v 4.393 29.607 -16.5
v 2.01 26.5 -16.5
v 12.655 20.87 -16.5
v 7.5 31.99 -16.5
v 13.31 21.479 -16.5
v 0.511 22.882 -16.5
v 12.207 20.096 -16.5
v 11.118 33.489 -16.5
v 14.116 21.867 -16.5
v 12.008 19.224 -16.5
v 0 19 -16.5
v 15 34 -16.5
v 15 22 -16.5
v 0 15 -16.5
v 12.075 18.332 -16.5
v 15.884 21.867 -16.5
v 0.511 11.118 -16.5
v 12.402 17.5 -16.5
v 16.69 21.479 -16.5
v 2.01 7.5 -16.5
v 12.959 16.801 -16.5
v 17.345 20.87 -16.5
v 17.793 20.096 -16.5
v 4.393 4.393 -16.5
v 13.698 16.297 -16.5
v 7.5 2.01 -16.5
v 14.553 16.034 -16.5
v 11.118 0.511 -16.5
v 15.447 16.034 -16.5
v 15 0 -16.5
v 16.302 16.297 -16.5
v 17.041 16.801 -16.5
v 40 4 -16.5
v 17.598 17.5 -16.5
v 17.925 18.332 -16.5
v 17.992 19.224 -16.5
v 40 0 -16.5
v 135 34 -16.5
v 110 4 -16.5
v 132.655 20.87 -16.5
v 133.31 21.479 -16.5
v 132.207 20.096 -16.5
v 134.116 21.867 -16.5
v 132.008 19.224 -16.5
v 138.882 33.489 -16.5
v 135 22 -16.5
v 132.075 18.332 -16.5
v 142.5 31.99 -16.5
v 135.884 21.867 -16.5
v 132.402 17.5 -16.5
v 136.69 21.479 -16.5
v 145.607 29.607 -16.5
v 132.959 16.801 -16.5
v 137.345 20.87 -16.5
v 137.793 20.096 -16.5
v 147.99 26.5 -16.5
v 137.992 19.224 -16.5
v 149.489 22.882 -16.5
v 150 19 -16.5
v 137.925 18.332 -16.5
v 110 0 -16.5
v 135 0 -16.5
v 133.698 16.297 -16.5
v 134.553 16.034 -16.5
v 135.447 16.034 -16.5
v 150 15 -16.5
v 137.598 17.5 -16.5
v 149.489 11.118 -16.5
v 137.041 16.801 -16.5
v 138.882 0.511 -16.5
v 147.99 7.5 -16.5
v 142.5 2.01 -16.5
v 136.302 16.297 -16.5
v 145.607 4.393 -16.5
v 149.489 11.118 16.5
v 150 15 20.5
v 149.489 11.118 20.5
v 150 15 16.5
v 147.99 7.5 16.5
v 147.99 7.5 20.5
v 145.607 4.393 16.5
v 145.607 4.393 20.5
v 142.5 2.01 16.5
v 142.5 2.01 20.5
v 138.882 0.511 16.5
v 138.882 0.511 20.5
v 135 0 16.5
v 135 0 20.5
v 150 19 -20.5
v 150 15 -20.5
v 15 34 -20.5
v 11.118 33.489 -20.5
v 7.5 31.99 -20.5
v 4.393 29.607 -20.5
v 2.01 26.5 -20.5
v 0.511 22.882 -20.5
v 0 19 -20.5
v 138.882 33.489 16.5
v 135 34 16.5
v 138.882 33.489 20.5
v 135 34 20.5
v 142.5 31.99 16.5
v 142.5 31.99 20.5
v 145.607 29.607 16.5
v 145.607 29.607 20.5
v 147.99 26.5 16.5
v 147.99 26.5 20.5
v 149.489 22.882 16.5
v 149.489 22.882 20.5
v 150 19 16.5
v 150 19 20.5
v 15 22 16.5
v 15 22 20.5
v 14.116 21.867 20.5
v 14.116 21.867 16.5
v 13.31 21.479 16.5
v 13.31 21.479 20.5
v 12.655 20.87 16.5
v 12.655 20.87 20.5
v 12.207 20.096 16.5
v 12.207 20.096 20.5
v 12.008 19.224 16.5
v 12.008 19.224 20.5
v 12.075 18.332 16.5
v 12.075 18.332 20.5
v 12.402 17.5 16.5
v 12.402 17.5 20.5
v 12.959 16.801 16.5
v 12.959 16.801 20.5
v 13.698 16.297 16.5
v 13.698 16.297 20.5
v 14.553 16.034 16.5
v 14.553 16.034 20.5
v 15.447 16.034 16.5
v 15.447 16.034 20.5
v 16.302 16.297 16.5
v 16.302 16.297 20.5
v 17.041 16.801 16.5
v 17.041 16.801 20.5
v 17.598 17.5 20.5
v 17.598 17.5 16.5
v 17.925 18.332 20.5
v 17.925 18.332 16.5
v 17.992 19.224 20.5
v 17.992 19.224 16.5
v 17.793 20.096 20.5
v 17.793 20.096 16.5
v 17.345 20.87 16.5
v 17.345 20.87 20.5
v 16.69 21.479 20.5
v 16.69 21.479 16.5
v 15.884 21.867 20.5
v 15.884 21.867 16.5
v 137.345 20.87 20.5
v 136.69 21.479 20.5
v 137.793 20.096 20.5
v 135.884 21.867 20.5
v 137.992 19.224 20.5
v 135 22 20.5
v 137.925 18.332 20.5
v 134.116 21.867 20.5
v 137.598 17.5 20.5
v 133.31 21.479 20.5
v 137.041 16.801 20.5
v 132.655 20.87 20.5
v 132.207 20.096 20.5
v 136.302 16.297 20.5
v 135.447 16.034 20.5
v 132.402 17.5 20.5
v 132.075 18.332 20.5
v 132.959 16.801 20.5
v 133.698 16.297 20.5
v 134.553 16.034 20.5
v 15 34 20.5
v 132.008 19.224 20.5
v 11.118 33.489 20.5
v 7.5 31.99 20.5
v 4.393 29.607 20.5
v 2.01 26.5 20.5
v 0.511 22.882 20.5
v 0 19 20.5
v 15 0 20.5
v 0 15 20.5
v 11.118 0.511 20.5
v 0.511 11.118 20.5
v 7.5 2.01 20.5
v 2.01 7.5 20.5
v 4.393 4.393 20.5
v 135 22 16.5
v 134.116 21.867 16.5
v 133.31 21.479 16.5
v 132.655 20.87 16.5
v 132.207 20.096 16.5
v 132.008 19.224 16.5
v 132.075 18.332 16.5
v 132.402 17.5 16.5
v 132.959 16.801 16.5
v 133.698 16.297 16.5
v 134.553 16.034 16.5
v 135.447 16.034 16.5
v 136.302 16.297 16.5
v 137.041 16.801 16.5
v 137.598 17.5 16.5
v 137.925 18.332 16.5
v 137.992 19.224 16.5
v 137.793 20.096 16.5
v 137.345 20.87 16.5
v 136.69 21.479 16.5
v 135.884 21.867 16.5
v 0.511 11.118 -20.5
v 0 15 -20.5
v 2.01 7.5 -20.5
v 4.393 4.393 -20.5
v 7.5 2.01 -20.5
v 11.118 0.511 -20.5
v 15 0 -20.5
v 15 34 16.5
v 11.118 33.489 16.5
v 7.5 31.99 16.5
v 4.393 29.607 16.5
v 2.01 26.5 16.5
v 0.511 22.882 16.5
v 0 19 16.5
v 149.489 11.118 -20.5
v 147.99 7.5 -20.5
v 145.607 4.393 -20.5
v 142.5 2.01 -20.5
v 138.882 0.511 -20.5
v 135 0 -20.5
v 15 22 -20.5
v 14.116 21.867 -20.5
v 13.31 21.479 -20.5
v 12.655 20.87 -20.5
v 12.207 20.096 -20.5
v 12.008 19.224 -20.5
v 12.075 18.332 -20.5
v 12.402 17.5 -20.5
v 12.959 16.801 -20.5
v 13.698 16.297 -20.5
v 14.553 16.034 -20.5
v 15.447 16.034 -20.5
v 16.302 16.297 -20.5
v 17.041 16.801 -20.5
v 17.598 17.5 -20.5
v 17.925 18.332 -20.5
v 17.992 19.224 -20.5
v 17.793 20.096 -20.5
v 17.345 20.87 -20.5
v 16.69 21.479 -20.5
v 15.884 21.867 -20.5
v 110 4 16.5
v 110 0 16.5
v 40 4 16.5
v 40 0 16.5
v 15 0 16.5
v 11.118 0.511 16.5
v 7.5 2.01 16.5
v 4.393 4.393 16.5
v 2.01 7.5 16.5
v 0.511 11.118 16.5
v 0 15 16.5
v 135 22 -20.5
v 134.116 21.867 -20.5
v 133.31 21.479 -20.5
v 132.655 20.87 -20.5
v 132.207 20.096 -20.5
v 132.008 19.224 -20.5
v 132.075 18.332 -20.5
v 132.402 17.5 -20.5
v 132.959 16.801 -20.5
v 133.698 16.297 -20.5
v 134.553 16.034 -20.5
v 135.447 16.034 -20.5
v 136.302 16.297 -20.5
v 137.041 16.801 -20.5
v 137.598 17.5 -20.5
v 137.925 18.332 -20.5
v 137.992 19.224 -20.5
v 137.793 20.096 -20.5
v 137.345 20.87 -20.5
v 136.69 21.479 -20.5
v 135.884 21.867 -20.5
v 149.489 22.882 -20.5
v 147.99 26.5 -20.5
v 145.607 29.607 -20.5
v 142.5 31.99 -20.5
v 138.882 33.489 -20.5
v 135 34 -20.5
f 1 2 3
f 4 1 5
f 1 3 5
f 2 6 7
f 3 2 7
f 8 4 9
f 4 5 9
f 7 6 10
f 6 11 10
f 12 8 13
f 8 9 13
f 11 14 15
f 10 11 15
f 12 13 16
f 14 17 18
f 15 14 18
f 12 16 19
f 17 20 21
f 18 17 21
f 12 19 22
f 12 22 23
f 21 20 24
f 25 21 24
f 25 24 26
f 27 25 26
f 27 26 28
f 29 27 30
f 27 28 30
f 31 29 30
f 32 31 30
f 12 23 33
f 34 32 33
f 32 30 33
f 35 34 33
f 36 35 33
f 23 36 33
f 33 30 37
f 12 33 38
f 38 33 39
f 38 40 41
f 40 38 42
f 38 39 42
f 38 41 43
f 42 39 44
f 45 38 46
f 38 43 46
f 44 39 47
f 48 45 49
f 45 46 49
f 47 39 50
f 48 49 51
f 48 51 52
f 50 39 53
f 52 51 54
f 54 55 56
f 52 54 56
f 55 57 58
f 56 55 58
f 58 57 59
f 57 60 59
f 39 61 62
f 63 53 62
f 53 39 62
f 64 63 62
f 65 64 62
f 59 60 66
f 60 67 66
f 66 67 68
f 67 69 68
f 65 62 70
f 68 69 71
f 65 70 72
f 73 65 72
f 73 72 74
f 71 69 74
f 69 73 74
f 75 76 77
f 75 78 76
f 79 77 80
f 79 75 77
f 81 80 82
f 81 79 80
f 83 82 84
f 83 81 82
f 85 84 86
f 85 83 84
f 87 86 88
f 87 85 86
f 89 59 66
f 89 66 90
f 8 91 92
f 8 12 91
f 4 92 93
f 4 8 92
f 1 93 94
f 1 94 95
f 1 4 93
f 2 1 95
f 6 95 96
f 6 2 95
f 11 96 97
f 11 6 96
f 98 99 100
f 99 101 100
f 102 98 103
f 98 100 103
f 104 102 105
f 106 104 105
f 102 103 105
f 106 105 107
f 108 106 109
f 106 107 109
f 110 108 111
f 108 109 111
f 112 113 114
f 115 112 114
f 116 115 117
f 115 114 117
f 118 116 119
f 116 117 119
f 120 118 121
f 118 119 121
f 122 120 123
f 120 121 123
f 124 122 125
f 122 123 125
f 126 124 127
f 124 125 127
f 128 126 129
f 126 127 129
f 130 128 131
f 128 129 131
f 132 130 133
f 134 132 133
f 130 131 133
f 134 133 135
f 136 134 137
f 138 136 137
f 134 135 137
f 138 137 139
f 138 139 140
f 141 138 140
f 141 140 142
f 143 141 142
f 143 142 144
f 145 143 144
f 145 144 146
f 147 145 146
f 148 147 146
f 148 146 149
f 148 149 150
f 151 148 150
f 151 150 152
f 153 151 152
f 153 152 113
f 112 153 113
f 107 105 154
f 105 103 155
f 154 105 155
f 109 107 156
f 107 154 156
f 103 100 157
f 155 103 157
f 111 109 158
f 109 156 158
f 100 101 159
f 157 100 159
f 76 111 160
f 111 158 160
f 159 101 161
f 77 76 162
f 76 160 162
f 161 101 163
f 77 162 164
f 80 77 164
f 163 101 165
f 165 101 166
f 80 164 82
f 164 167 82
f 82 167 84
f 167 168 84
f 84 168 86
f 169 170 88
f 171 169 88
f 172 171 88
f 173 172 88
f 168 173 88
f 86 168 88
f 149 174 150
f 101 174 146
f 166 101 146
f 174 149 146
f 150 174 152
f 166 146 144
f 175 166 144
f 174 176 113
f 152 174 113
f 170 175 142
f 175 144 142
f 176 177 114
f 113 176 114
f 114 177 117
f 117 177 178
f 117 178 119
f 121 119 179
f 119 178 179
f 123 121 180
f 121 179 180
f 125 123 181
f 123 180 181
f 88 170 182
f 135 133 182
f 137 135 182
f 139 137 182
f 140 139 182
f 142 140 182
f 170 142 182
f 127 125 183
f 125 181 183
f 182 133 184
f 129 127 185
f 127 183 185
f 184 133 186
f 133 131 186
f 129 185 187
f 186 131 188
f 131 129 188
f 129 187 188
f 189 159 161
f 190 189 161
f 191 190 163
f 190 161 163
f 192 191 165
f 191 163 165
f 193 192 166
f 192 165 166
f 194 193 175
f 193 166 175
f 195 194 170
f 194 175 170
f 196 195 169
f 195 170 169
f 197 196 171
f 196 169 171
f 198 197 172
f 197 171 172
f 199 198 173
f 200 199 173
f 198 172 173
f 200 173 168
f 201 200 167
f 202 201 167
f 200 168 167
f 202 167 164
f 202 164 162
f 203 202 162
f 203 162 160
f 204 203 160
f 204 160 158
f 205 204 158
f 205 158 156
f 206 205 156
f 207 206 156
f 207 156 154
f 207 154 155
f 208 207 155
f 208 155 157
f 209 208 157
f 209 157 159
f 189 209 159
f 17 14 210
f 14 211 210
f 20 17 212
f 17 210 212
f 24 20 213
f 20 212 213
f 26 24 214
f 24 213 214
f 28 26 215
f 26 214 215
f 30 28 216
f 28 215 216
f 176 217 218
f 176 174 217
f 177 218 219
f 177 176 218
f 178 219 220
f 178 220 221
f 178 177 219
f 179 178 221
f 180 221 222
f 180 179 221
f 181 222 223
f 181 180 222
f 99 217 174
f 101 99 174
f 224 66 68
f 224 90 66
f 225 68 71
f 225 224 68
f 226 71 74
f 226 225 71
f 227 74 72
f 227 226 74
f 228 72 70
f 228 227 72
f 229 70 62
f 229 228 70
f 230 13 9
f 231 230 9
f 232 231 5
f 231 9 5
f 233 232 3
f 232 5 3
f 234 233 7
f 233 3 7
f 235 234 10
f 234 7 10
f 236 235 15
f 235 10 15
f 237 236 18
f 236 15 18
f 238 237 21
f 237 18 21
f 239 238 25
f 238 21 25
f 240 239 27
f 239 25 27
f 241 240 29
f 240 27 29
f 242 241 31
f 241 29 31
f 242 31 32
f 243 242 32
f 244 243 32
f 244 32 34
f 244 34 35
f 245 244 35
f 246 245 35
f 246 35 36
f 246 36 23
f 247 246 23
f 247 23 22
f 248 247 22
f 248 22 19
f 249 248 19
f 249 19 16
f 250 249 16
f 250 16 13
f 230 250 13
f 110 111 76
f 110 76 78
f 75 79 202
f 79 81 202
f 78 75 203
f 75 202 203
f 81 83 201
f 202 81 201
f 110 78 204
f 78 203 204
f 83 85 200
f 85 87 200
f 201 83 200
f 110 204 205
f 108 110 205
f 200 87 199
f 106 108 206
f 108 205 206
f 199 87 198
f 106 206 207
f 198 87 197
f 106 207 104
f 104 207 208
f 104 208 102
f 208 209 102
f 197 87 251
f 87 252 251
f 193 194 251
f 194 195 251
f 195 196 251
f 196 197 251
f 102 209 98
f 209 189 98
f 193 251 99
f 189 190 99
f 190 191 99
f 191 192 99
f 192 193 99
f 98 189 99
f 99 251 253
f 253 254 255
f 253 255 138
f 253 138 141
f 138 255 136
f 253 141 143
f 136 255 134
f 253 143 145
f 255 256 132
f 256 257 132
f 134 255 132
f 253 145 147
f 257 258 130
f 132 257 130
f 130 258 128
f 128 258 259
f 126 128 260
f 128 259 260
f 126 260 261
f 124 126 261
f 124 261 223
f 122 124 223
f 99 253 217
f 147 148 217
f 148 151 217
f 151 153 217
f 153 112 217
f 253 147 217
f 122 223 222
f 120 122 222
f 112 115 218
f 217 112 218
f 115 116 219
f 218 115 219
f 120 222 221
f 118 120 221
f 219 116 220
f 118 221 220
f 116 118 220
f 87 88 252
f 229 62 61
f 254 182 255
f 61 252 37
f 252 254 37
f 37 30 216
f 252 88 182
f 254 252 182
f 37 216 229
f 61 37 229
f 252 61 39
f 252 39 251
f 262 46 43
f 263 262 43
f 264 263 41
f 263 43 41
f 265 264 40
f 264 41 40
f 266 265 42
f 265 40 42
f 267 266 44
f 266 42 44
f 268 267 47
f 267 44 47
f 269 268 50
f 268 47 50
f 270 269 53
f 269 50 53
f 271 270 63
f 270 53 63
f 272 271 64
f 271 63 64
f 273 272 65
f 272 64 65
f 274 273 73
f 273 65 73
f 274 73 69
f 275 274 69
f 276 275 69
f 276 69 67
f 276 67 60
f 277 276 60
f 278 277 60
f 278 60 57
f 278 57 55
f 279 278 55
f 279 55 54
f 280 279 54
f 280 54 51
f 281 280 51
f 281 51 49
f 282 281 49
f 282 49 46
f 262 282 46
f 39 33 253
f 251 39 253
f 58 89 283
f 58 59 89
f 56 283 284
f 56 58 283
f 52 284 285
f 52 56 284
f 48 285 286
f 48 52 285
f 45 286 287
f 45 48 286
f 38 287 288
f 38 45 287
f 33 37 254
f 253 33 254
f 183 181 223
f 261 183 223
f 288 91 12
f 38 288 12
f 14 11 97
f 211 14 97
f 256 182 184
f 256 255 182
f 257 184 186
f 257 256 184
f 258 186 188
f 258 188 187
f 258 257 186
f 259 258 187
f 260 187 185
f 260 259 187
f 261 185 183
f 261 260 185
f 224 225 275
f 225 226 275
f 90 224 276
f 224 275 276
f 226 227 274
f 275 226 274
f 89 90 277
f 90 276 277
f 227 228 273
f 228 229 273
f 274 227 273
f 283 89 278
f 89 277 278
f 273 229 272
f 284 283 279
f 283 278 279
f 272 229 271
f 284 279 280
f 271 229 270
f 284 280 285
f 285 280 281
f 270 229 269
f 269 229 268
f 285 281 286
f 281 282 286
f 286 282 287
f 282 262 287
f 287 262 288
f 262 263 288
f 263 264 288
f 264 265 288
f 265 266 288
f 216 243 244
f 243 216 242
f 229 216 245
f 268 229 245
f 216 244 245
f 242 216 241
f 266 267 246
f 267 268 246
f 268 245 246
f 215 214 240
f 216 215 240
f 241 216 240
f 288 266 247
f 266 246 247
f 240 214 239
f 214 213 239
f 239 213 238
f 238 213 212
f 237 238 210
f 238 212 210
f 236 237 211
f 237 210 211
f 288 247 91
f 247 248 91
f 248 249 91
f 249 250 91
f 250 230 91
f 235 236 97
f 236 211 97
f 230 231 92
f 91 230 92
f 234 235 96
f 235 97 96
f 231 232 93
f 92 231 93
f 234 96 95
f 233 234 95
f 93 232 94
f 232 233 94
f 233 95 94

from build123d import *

# Parameters (mm, degrees)
EXTRUDE_1_DEPTH     = 150
SKETCH_2_R          = 3
CUT_EXTRUDE_1_DEPTH = 300
SKETCH_3_W          = 40
SKETCH_3_H          = 33
CUT_EXTRUDE_2_DEPTH = 10
FILLET_1_R          = 15


with BuildPart() as part:
    # 草图1 → 凸台-拉伸1 (new body)
    with BuildSketch(Plane(origin=(0, 0, 0), x_dir=(0, 0, -1), z_dir=(1, 0, 0))):
        Polygon((-16.5, 4), (-16.5, 34), (-20.5, 34), (-20.5, 0), (0, 0), (0, 4), align=None)
        Polygon((16.5, 4), (0, 4), (0, 0), (20.5, 0), (20.5, 34), (16.5, 34), align=None)
    extrude(amount=EXTRUDE_1_DEPTH)

    # 草图2 → 切除-拉伸1 (cut)
    with BuildSketch(Plane.XY.offset(20.5)):
        with Locations(Location((15, 19, 0), (0, 0, 90))):
            Circle(SKETCH_2_R)
        with Locations(Location((135, 19, 0), (0, 0, 90))):
            Circle(SKETCH_2_R)
    extrude(amount=-CUT_EXTRUDE_1_DEPTH, mode=Mode.SUBTRACT)

    # 草图3 → 切除-拉伸2 (cut)
    with BuildSketch(Plane.XZ):
        with Locations((130, 0)):
            Rectangle(SKETCH_3_W, SKETCH_3_H)
        with Locations((20, 0)):
            Rectangle(SKETCH_3_W, SKETCH_3_H)
    extrude(amount=-CUT_EXTRUDE_2_DEPTH, mode=Mode.SUBTRACT)

    # 圆角1
    fillet_1_edges = [part.edges().sort_by_distance(p)[0] for p in [
        (0, 0, 18.5),
        (0, 34, 18.5),
        (150, 34, 18.5),
        (150, 0, 18.5),
        (150, 34, -18.5),
        (150, 0, -18.5),
        (0, 0, -18.5),
        (0, 34, -18.5),
    ]]
    fillet(fillet_1_edges, radius=FILLET_1_R)


solid = part.part
